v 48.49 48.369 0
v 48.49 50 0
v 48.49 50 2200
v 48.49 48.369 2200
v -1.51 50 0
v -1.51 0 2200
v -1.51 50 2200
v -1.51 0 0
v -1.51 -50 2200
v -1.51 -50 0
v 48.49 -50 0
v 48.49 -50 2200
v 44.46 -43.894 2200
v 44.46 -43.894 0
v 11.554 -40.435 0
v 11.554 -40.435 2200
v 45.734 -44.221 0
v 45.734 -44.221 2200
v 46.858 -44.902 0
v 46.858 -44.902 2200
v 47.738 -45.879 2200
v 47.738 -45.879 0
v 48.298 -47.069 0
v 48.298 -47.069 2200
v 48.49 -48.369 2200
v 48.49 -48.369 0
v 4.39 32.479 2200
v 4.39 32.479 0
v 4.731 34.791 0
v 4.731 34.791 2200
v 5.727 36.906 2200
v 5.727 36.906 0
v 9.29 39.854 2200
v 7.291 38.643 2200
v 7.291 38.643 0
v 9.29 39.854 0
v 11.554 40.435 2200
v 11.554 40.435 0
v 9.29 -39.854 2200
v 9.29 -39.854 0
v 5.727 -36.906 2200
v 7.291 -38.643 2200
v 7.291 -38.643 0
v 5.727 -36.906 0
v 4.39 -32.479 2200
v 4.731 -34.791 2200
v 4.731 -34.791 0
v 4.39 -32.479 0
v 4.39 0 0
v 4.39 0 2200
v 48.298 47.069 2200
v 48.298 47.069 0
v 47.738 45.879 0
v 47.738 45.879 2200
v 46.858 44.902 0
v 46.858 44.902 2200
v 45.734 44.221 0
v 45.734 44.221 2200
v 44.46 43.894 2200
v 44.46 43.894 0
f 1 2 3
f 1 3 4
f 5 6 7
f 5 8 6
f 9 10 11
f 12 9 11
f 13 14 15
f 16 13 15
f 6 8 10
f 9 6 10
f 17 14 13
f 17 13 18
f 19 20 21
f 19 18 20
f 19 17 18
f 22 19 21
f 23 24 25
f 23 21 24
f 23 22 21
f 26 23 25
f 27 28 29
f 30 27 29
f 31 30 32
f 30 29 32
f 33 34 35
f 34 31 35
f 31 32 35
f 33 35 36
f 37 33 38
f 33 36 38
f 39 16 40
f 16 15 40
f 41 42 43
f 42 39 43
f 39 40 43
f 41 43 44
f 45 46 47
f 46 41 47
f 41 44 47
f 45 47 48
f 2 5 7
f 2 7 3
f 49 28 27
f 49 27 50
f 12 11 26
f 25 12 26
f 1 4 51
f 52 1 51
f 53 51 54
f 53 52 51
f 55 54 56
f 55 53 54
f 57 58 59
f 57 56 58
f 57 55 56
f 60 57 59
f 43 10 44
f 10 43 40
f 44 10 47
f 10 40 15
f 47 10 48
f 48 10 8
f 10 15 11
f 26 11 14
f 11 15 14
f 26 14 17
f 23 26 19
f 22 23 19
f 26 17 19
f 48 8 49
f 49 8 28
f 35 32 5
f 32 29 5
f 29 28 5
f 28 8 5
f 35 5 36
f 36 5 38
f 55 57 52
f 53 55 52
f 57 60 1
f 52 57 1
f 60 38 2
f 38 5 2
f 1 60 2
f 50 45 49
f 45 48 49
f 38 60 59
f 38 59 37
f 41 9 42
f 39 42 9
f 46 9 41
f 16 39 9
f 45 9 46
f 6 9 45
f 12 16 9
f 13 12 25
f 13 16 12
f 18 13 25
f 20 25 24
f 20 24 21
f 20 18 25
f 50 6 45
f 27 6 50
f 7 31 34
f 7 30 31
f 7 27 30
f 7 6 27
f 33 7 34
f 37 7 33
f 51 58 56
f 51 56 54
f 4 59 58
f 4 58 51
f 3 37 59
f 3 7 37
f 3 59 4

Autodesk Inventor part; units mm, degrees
ref_plane "YZ Plane" through (0, 0, 0) normal (1, 0, 0) x (0, 1, 0)
ref_plane "Start plane" through (0, 0, 0) normal (0, 0, 1) x (1, 0, 0)
ref_plane "End plane" through (0, 0, 2200) normal (0, 0, 1) x (1, 0, 0)
sketch "Sketch" plane through (0, 0, 0) normal (0, 0, 1) x (1, 0, 0)
  line L0 (-1.51, 0) -> (-1.51, 50)
  line L1 (-1.51, 50) -> (48.49, 50)
  line L2 (48.49, 50) -> (48.49, 48.3694)
  line L3 (44.4604, 43.894) -> (11.5538, 40.4354)
  line L4 (4.39, 32.4792) -> (4.39, 0)
  line L5 (4.39, 0) -> (-1.51, 0) construction
  line L6 (26.44, 50) -> (26.44, 42) construction
  line L7 (48.49, 44.3175) -> (48.49, 42) construction
  line L8 (48.49, 42) -> (26.44, 42) construction
  line L9 (0, 15) -> (0, -27) construction
  line L10 (-5.539, 0) -> (16.0067, 0) construction
  line L11 (-1.51, 0) -> (-1.51, -50)
  line L12 (-1.51, -50) -> (48.49, -50)
  line L13 (48.49, -50) -> (48.49, -48.3694)
  line L14 (44.4604, -43.894) -> (11.5538, -40.4354)
  line L15 (4.39, -32.4792) -> (4.39, 0)
  arc A0 (11.5538, 40.4354) -> (4.39, 32.4792) centre (12.39, 32.4792) ccw
  arc A1 (4.39, -32.4792) -> (11.5538, -40.4354) centre (12.39, -32.4792) ccw
  arc A2 (44.4604, 43.894) -> (48.49, 48.3694) centre (43.99, 48.3694) ccw
  arc A3 (48.49, -48.3694) -> (44.4604, -43.894) centre (43.99, -48.3694) ccw
  line L16 (0, 70) -> (0, -70) construction
  line L17 (-16.5166, 0) -> (60.3266, 0) construction
  point P0 (4.39, 39.6825)
  point P1 (48.49, -44.3175)
  point P2 (4.39, -39.6825)
  point P3 (26.44, -50)
  point P4 (26.44, -42)
  dimension "d0" = 5.9
  dimension "d1" = 50
  dimension "d2" = 50
  dimension "d3" = 8
  dimension "d4" = 22.05
  dimension "d5" = 2.3175
  dimension "d23" = 8
  dimension "d24" = 4.5
  dimension "d25" = 1.51
extrude "Body" add sketch "Sketch" along normal up to surface (2200 mm away) from surface at 0
sketch "Sketch3" plane through (0, 0, 0) normal (0, 0, 1) x (1, 0, 0)
  line L0 (0, 0) -> (10, 0)
ref_plane "Work Plane3" through (0, 0, 0) normal (0, -1, 0) x (1, 0, 0)
sketch "Sketch4" plane through (0, 0, 0) normal (0, -1, 0) x (1, 0, 0)
  line L0 (-2, 0) -> (12, 0) projected
  line L1 (-2, 2200) -> (12, 2200) projected
  dimension "d29" = 2200
equation "\"d0\" = G_T"
equation "\"d1\" = 0.5 * G_H"
equation "\"d2\" = G_W"
equation "\"d3\" = G_T1"
equation "\"d4\" = G_C"
equation "\"d23\" = G_IR"
equation "\"d24\" = G_ER"
equation "\"d25\" = ex"
equation "\"d6\" = G_L"
equation "\"G_W\" = 50"
equation "\"G_T\" = 5.9"
equation "\"G_T1\" = 8"
equation "\"G_NG\" = 0.105104"
equation "\"G_ER\" = 4.5"
equation "\"G_IR\" = 8"
equation "\"G_C\" = 22.05"
equation "\"G_L\" = d29"
equation "\"ex\" = 1.51"
equation "\"G_OFFSET_START\" = 0"
equation "\"G_OFFSET_END\" = 0"
equation "\"G_H\" = 100"
properties part number "ISO 657/11 - CH 100 x 10 - 2200" material "Steel, Mild"
